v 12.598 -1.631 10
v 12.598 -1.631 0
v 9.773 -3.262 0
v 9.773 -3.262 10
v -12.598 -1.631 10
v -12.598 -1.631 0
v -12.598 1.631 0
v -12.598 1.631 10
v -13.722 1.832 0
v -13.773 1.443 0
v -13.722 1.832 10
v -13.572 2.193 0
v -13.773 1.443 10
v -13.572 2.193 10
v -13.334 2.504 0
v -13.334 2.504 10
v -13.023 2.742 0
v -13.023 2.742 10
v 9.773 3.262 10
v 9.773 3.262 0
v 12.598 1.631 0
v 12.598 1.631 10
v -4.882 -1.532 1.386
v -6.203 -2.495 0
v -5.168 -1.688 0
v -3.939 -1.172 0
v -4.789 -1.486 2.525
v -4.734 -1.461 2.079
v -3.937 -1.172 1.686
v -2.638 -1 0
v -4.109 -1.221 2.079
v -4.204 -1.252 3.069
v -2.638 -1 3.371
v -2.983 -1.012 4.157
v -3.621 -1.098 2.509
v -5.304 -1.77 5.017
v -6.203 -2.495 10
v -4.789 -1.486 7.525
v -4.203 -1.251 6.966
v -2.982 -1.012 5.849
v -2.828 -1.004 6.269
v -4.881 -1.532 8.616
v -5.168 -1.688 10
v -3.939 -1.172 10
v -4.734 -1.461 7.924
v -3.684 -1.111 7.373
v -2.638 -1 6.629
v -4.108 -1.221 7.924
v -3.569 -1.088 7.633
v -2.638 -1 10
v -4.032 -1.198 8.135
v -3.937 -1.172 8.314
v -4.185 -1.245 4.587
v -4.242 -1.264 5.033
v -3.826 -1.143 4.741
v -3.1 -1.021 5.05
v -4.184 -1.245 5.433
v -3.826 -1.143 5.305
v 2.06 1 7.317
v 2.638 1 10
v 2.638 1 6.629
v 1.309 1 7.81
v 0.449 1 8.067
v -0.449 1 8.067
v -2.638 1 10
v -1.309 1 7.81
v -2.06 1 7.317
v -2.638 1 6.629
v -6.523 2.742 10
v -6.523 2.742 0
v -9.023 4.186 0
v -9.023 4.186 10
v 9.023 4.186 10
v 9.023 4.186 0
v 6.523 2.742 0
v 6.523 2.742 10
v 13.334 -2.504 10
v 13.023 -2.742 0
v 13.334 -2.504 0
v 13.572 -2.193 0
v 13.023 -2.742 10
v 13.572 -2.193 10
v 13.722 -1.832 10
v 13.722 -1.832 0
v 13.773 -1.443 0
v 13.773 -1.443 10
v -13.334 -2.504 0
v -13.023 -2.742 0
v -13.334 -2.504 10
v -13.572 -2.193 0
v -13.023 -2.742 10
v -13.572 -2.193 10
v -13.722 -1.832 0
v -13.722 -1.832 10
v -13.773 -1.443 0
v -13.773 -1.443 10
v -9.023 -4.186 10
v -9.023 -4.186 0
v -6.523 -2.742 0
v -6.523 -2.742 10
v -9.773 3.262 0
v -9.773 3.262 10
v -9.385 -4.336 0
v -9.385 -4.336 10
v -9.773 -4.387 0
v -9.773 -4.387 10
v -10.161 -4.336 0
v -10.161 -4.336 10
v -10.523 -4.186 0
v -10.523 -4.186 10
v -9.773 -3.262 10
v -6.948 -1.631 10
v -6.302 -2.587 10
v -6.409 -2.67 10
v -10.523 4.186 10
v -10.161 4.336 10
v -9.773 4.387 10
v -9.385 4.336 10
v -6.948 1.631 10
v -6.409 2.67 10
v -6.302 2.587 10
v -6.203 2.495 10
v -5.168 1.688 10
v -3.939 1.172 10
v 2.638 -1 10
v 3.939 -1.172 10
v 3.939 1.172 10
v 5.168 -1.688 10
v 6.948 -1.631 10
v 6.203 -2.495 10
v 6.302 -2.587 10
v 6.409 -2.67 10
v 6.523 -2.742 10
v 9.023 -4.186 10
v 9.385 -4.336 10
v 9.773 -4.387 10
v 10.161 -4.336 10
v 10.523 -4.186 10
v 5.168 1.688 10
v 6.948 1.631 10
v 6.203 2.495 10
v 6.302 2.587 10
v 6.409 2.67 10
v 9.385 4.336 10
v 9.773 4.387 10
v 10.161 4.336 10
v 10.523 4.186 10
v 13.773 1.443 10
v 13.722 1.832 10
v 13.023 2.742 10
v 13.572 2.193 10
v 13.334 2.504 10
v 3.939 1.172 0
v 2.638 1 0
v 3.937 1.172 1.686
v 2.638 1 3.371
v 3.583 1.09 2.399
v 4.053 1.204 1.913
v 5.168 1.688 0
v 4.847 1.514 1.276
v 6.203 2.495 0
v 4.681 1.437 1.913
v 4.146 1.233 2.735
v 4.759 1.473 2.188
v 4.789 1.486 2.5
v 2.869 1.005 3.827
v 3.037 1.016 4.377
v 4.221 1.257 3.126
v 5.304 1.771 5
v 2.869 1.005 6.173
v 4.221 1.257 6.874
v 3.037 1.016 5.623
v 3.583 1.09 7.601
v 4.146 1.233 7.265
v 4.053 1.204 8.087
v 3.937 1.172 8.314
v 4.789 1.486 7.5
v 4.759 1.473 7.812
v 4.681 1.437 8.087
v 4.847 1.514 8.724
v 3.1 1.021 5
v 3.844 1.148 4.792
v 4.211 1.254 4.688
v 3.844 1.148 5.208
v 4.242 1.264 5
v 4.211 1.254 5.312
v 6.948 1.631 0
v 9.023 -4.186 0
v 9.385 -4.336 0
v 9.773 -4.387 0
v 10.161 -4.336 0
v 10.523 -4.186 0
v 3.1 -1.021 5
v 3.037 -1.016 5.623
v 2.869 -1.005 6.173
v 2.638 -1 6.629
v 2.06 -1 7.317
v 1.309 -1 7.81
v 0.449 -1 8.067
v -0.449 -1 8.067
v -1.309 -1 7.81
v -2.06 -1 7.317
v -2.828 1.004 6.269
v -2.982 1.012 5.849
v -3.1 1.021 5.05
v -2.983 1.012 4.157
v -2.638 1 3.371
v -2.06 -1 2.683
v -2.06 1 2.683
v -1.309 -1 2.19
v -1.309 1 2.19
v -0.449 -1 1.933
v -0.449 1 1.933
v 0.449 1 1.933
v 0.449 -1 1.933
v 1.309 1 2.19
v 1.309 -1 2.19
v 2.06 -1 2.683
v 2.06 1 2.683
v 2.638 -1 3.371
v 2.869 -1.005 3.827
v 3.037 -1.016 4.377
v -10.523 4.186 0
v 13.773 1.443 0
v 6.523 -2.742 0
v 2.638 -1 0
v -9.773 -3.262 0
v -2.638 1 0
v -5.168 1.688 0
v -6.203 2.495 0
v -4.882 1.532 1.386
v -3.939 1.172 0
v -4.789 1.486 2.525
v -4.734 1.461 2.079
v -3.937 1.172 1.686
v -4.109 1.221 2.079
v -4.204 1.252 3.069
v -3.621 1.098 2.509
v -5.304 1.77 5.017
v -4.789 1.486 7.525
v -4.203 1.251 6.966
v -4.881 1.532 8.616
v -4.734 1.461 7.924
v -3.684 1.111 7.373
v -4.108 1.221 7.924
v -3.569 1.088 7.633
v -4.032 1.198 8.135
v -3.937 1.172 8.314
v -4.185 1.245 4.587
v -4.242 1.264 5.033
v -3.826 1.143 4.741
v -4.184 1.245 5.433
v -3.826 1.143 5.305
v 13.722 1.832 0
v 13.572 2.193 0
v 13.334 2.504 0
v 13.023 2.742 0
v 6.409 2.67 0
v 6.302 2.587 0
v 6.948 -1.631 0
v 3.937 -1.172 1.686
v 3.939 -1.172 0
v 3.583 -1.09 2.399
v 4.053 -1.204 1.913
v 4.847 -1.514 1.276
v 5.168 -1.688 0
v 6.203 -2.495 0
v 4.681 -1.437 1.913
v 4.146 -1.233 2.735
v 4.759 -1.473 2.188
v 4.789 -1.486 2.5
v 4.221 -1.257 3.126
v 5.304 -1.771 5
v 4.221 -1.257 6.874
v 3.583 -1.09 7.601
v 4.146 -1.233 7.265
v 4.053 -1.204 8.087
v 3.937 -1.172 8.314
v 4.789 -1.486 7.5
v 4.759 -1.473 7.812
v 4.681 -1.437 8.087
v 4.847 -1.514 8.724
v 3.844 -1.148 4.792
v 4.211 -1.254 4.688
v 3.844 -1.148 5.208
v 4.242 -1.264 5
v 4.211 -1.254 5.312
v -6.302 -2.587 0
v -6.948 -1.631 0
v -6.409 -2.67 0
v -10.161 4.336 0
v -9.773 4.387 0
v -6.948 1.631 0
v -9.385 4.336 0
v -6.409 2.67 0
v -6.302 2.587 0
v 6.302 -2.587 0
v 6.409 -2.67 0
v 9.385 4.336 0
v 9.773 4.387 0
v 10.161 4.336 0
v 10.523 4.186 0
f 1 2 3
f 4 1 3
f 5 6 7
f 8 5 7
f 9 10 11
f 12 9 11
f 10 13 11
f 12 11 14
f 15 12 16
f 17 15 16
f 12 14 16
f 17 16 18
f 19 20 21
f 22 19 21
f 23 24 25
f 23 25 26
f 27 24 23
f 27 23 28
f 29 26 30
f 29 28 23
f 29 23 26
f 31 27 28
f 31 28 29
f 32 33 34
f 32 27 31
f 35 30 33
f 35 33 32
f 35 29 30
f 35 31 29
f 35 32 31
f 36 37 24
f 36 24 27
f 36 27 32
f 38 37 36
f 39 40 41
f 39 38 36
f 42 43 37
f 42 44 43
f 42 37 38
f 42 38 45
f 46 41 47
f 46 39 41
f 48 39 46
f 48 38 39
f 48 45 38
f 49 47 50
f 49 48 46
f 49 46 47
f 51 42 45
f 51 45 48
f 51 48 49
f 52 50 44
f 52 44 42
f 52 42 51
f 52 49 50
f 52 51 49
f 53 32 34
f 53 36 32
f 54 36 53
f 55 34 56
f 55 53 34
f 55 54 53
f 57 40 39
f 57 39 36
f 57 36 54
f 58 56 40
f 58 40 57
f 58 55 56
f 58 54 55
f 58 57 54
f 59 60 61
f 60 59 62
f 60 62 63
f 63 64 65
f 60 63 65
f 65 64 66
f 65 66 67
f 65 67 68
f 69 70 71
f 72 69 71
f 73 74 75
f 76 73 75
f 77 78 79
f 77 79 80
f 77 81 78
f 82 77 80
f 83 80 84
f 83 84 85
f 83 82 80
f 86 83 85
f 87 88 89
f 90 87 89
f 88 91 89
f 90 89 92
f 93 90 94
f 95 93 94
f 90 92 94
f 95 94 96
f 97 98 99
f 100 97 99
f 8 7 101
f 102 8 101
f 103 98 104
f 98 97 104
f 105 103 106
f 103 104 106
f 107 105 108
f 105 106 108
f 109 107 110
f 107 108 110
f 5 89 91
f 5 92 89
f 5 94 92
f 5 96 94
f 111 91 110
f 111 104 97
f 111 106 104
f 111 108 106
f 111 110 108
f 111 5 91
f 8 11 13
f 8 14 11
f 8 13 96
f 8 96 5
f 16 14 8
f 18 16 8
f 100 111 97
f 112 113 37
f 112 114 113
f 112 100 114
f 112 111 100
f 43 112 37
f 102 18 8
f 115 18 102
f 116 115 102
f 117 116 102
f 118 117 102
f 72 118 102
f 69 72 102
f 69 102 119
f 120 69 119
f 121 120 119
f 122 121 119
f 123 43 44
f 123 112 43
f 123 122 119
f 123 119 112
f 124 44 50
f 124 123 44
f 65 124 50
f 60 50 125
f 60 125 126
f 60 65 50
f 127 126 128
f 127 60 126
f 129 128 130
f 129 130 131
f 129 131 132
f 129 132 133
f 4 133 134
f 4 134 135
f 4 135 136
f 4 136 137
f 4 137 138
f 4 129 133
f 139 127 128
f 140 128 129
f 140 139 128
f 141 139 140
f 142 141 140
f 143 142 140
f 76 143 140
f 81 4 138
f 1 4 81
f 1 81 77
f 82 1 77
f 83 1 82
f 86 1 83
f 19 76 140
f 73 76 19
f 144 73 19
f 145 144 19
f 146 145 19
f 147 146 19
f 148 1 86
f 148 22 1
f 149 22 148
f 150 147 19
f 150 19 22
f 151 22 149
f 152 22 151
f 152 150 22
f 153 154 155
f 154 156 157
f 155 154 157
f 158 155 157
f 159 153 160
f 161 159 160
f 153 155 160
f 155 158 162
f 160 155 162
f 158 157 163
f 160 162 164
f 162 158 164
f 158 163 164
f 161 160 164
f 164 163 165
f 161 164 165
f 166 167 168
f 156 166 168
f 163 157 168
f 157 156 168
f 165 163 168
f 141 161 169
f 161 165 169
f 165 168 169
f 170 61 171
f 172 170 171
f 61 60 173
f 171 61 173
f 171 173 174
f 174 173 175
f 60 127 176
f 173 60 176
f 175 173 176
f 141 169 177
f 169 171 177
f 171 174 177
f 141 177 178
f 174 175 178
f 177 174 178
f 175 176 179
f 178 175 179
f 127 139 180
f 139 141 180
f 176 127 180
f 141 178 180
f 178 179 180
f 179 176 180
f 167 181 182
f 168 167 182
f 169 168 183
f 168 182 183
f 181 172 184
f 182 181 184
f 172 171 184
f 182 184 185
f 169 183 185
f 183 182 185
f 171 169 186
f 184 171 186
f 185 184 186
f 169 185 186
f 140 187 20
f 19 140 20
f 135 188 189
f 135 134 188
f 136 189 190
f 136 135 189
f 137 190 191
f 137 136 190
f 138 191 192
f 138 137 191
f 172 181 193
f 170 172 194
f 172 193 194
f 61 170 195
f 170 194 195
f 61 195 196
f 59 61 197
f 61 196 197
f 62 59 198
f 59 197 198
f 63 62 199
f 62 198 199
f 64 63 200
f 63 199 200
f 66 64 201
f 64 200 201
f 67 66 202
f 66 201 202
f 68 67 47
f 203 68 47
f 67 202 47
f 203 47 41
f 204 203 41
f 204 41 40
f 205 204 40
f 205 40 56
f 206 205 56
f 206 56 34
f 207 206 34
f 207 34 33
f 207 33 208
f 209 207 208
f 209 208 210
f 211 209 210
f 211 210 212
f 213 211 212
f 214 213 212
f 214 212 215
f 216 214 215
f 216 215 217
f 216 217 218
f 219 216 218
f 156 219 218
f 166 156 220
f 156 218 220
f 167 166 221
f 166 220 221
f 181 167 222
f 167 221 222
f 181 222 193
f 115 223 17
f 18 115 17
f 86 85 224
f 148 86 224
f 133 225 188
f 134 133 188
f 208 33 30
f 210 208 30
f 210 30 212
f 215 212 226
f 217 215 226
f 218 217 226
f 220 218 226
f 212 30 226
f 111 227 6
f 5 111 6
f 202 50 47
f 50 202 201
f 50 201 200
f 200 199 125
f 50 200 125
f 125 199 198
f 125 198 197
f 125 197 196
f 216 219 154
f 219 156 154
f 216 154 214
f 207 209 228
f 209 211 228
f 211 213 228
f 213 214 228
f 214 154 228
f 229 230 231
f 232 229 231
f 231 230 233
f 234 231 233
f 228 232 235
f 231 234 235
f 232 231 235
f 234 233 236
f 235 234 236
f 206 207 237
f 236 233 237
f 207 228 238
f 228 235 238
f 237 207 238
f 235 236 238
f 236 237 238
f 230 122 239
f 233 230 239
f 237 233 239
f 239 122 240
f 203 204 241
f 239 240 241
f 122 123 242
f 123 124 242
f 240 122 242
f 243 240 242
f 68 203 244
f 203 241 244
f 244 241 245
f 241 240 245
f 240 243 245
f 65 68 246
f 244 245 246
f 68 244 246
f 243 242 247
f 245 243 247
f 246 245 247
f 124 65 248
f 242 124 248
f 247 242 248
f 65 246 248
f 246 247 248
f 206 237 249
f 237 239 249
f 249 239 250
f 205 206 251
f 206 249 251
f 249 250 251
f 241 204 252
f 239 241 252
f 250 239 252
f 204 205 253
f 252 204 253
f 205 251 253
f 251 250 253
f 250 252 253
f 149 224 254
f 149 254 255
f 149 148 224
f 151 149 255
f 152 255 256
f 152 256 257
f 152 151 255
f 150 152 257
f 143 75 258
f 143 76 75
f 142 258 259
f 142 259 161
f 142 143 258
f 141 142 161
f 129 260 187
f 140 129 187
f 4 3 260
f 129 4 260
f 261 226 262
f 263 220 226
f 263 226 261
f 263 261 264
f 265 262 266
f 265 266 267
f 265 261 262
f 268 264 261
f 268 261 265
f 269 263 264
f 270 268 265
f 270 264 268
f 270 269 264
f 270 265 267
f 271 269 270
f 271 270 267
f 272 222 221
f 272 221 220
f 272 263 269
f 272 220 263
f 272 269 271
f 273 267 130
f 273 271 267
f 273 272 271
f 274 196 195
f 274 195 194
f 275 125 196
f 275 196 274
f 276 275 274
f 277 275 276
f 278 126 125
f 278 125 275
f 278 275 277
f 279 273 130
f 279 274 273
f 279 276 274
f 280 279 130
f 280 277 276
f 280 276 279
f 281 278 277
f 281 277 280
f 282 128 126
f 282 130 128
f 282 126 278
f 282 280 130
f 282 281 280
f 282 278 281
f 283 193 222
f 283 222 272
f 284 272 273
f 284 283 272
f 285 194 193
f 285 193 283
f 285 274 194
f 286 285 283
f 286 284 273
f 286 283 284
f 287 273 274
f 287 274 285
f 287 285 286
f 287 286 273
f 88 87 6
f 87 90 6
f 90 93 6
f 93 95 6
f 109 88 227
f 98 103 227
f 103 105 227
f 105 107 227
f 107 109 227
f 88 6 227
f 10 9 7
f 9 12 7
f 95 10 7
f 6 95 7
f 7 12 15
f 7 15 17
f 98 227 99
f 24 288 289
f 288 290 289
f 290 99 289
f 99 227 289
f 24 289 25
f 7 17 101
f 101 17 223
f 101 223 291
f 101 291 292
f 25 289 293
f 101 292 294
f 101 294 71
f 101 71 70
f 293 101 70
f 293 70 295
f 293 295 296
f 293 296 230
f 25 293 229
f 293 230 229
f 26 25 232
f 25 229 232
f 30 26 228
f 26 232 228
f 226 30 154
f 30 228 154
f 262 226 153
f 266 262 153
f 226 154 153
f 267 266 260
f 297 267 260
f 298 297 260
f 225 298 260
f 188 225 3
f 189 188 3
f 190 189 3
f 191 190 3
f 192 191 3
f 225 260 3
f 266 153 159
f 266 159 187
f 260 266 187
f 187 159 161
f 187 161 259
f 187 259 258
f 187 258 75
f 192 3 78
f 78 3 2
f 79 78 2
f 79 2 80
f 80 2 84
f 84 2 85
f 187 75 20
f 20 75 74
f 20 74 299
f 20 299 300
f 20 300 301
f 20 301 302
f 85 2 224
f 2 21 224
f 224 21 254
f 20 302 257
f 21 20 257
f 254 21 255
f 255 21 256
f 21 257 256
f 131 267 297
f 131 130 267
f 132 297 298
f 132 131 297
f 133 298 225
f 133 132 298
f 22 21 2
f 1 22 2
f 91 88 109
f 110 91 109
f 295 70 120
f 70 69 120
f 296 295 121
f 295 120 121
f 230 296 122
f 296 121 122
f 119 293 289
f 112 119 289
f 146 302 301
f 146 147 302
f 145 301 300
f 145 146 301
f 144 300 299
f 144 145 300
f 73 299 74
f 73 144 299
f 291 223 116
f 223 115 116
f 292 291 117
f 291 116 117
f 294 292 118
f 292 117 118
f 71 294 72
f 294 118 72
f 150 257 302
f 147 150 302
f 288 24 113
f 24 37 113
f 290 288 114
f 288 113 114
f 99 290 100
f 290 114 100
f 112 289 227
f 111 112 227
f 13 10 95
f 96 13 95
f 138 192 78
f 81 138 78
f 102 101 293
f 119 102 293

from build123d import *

# Parameters (mm, degrees)
F1_DEPTH = 10
F2_R     = 1.5
F4_R     = 5
F3_R     = 3.1
F5_DEPTH = 2.5


with BuildPart() as f1:
    # F0 (on Top) → F1 (new body)
    with BuildSketch(Plane.XY):
        Polygon((0, 1), (-5.773, 1), (-5.773, -1), (0, -1), (5.773, -1), (5.773, 1), align=None)
        Polygon((-5.773, 1), (-5.773, 2.3094010768), (-9.773, 4.6188021535), (-13.773, 2.3094010768), (-13.773, -2.3094010768), (-9.773, -4.6188021535), (-5.773, -2.3094010768), (-5.773, -1), align=None)
        Polygon((-9.773, 3.2620290209), (-6.948, 1.6310145105), (-6.948, -1.6310145105), (-9.773, -3.2620290209), (-12.598, -1.6310145105), (-12.598, 1.6310145105), align=None, mode=Mode.SUBTRACT)
        Polygon((5.773, 2.3094010768), (5.773, 1), (5.773, -1), (5.773, -2.3094010768), (9.773, -4.6188021535), (13.773, -2.3094010768), (13.773, 2.3094010768), (9.773, 4.6188021535), align=None)
        Polygon((6.948, 1.6310145105), (9.773, 3.2620290209), (12.598, 1.6310145105), (12.598, -1.6310145105), (9.773, -3.2620290209), (6.948, -1.6310145105), align=None, mode=Mode.SUBTRACT)
    extrude(amount=F1_DEPTH)

    # F2
    f2_edges = [f1.edges().sort_by_distance(p)[0] for p in [
        (-9.773, -4.618802, 5),
        (-13.773, -2.309401, 5),
        (-13.773, 2.309401, 5),
        (-9.773, 4.618802, 5),
        (-5.773, 2.309401, 5),
        (-5.773, -2.309401, 5),
        (5.773, 2.309401, 5),
        (9.773, 4.618802, 5),
        (13.773, 2.309401, 5),
        (13.773, -2.309401, 5),
        (9.773, -4.618802, 5),
        (5.773, -2.309401, 5),
    ]]
    fillet(f2_edges, radius=F2_R)

    # F4
    f4_edges = [f1.edges().sort_by_distance(p)[0] for p in [
        (-5.773, -1, 5),
        (-5.773, 1, 5),
        (5.773, 1, 5),
        (5.773, -1, 5),
    ]]
    fillet(f4_edges, radius=F4_R)

    # F3 (on face) → F5 (cut, symmetric)
    with BuildSketch(Plane.XZ.offset(1)):
        with Locations((0, 5)):
            Circle(F3_R)
    extrude(amount=F5_DEPTH, both=True, mode=Mode.SUBTRACT)


solid = f1.part
